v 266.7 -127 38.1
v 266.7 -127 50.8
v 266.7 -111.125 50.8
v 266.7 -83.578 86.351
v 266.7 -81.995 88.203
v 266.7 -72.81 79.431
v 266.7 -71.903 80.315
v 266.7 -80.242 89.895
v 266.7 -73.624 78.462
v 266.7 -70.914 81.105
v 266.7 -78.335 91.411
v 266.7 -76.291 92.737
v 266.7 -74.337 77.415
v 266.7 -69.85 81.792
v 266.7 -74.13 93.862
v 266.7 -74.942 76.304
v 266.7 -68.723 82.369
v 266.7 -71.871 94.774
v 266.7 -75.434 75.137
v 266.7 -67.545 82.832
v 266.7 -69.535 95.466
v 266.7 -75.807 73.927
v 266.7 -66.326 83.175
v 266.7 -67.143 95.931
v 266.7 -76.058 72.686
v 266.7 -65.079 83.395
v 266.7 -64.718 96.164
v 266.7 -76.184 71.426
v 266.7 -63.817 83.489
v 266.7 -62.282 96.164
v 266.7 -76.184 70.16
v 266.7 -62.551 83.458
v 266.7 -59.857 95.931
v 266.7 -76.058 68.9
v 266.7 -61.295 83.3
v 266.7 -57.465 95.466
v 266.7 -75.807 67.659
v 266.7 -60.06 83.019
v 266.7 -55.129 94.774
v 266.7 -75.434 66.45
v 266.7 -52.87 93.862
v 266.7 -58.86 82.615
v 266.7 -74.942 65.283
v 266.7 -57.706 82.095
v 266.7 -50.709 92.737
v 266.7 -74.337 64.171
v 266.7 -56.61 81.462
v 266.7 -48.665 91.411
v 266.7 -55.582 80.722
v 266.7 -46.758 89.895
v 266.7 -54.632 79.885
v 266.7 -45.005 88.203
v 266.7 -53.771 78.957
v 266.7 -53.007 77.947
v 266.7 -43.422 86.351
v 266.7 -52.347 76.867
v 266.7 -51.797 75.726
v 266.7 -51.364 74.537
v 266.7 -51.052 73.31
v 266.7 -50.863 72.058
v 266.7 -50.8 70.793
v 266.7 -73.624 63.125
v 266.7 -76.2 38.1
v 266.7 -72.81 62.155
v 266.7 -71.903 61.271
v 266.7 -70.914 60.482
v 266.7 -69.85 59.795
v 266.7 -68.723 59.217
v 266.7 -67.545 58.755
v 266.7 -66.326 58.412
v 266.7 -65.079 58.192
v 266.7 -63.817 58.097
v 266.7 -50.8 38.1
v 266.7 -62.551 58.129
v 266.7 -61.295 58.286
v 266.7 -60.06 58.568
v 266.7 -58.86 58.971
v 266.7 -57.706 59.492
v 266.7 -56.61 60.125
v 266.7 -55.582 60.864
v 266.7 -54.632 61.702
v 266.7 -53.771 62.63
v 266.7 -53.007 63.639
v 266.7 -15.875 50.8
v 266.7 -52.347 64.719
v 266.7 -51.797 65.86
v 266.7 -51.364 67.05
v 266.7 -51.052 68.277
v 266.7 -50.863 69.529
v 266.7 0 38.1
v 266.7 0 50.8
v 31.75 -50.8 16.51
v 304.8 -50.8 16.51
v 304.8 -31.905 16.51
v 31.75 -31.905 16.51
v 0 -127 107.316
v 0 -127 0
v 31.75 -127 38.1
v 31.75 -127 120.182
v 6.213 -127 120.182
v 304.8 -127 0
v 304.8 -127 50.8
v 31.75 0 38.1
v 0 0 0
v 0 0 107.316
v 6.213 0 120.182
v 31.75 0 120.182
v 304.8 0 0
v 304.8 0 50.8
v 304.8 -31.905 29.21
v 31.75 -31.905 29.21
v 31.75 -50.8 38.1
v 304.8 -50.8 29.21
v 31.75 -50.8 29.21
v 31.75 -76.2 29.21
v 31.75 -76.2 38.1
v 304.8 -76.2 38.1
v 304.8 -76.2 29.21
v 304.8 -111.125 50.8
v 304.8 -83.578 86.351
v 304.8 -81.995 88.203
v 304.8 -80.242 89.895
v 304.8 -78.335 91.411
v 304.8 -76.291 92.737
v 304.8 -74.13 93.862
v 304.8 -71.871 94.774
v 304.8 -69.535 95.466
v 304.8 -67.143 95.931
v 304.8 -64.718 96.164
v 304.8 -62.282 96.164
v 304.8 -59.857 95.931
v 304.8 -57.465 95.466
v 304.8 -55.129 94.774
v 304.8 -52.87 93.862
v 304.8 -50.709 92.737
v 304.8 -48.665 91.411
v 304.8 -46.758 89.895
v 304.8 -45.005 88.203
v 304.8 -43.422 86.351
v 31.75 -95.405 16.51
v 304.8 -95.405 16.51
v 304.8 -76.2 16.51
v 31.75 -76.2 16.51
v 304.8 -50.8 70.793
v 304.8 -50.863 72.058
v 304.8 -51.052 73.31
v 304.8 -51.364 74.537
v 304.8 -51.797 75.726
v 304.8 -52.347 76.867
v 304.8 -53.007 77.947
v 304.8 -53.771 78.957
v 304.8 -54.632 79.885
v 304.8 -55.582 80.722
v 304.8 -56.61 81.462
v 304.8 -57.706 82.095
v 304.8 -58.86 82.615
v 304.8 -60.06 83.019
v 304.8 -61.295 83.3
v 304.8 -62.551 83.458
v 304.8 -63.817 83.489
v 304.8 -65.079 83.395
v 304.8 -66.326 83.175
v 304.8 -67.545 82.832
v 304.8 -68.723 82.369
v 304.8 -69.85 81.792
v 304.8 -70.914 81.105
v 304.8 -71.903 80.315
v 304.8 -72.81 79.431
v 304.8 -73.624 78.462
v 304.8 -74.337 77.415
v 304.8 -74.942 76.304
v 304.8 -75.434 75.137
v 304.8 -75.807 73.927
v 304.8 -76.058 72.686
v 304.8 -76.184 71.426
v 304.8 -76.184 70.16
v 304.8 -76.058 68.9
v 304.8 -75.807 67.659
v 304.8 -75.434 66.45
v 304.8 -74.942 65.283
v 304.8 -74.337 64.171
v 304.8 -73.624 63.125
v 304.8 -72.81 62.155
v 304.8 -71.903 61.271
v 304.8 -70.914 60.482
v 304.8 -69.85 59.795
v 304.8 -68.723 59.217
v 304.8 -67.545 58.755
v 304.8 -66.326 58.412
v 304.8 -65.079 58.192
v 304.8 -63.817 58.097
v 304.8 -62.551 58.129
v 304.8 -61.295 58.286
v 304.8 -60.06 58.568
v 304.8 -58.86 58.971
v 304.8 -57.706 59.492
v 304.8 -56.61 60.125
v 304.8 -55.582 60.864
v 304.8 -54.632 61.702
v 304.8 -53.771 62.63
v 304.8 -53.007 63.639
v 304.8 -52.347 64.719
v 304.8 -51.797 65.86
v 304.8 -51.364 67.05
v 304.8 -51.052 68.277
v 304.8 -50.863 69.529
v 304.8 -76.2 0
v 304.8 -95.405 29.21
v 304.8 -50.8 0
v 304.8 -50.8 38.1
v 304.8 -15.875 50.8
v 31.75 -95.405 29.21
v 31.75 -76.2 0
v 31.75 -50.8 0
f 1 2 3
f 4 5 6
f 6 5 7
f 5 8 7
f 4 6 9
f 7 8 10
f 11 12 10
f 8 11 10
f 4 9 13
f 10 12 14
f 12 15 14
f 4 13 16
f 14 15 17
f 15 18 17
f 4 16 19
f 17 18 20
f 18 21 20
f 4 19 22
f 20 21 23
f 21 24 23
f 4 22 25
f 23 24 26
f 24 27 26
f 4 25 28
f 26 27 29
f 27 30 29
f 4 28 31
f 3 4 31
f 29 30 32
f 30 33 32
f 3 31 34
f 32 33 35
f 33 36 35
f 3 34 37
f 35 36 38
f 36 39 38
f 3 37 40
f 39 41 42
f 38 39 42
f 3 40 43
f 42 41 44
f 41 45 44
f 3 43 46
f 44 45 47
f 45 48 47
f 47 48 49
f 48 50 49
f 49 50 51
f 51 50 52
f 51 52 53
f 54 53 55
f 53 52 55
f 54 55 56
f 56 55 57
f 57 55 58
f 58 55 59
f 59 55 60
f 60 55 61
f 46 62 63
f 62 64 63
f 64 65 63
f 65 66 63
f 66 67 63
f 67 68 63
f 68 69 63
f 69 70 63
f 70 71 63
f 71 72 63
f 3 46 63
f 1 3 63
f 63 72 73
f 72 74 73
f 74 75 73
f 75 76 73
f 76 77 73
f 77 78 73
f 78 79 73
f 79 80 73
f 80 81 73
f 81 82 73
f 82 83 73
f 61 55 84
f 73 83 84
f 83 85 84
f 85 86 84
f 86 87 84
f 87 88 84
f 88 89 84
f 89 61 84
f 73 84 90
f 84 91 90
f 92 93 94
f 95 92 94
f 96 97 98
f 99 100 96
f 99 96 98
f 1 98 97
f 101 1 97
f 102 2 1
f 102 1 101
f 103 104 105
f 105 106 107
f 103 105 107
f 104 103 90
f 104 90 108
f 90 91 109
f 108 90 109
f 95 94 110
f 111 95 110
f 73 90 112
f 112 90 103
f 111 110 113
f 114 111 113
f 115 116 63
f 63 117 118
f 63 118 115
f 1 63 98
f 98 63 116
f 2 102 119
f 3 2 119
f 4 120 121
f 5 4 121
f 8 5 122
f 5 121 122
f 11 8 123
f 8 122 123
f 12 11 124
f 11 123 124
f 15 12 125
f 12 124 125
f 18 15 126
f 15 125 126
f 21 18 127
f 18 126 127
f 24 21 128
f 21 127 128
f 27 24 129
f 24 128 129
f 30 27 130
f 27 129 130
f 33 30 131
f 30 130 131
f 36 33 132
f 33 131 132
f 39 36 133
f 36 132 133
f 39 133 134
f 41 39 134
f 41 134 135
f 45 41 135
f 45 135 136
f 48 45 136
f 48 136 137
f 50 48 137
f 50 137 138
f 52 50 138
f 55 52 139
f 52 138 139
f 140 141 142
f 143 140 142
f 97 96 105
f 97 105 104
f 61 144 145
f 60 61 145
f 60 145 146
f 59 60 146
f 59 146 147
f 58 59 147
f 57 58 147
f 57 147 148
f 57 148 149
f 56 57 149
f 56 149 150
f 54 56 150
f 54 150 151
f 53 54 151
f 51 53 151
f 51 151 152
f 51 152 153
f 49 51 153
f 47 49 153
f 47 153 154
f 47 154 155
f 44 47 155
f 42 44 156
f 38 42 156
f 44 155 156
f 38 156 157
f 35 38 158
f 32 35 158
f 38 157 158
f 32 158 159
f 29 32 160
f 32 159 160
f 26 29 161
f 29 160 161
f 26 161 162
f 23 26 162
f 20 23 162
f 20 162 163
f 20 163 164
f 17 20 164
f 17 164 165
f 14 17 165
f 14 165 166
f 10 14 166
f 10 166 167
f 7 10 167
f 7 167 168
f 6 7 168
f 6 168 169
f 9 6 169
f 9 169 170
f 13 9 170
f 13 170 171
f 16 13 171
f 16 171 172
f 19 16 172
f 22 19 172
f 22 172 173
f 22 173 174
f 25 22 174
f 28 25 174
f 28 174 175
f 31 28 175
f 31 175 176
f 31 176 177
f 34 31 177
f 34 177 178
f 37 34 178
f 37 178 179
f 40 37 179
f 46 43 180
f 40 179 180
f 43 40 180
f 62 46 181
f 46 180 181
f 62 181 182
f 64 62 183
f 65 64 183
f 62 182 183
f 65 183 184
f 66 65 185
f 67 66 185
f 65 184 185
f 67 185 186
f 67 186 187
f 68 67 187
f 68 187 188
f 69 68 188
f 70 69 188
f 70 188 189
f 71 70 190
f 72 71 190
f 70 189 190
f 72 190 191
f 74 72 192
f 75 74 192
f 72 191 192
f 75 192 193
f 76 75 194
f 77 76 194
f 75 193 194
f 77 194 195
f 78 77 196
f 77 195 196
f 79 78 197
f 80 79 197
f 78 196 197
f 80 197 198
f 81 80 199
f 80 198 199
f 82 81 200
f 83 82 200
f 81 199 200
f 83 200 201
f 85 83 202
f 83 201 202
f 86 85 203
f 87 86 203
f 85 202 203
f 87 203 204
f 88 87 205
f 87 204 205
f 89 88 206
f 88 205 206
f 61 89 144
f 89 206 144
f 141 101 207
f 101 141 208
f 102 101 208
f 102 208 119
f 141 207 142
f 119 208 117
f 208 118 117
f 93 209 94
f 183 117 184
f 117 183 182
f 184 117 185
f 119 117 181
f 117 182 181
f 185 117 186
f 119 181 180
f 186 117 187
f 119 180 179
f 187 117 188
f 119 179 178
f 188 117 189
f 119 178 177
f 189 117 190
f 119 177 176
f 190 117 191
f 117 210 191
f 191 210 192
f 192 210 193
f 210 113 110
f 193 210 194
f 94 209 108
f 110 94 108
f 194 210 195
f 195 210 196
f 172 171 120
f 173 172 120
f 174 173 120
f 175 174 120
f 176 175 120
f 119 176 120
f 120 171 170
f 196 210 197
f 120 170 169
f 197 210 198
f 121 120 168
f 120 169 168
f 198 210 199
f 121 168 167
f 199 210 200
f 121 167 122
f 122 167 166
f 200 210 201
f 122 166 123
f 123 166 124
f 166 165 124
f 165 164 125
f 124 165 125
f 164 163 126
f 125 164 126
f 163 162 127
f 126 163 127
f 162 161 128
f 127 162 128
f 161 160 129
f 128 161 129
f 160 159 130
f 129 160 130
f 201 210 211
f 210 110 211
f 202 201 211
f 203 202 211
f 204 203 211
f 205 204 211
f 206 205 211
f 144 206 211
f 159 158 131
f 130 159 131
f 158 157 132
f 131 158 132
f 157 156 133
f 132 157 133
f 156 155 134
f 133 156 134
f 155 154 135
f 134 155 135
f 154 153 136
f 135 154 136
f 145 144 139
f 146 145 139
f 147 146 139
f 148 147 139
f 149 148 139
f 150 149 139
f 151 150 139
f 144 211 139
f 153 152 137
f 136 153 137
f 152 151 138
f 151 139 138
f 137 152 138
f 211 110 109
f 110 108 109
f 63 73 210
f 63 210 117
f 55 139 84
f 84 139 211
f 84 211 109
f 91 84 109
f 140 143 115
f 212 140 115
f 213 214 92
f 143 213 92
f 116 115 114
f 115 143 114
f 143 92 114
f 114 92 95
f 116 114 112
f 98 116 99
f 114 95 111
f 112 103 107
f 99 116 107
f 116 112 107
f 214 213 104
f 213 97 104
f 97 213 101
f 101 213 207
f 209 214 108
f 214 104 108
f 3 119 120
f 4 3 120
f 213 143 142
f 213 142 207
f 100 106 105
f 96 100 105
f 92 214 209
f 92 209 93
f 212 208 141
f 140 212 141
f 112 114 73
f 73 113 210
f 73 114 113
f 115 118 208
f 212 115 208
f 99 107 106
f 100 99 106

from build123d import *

# Parameters (mm, degrees)
F0_W     = 38.1
F0_H     = 41.149566
F1_DEPTH = 127
F3_DEPTH = 273.05
F2_R     = 12.7
F4_DEPTH = 254


with BuildPart() as f1:
    # F0 (on Front) → F1 (new body)
    with BuildSketch(Plane.XZ):
        Polygon((6.213259, 120.18176), (0, 107.315989), (0, 0), (304.8, 0), (304.8, 60.450434), (266.7, 60.450434), (266.7, 38.1), (31.75, 38.1), (31.75, 120.18176), align=None)
        with Locations((285.75, 81.025217)):
            Rectangle(F0_W, F0_H)
    extrude(amount=F1_DEPTH)

    # F2 (on face) → F3 (cut)
    with BuildSketch(Plane.YZ.offset(304.8)):
        Polygon((-76.2, 16.51), (-76.2, 0), (-50.8, 0), (-50.8, 16.51), (-31.905102, 16.51), (-31.905102, 29.21), (-50.8, 29.21), (-50.8, 38.1), (-76.2, 38.1), (-76.2, 29.21), (-95.405102, 29.21), (-95.405102, 16.51), align=None)
    extrude(amount=-F3_DEPTH, mode=Mode.SUBTRACT)

    # F2 (on face) → F4 (cut)
    with BuildSketch(Plane.YZ.offset(304.8)):
        with Locations((-63.5, 70.793197)):
            Circle(F2_R)
        with BuildLine():
            Line((-127, 101.6), (-127, 50.8))
            Line((-127, 50.8), (-111.125, 50.8))
            Line((-111.125, 50.8), (-83.577839, 86.350843))
            ThreePointArc((-83.577839, 86.350843), (-63.5, 96.193197), (-43.422161, 86.350843))
            Line((-43.422161, 86.350843), (-15.875, 50.8))
            Line((-15.875, 50.8), (0, 50.8))
            Line((0, 50.8), (0, 101.6))
            Line((0, 101.6), (-127, 101.6))
        make_face()
    extrude(amount=-F4_DEPTH, mode=Mode.SUBTRACT)


solid = f1.part
